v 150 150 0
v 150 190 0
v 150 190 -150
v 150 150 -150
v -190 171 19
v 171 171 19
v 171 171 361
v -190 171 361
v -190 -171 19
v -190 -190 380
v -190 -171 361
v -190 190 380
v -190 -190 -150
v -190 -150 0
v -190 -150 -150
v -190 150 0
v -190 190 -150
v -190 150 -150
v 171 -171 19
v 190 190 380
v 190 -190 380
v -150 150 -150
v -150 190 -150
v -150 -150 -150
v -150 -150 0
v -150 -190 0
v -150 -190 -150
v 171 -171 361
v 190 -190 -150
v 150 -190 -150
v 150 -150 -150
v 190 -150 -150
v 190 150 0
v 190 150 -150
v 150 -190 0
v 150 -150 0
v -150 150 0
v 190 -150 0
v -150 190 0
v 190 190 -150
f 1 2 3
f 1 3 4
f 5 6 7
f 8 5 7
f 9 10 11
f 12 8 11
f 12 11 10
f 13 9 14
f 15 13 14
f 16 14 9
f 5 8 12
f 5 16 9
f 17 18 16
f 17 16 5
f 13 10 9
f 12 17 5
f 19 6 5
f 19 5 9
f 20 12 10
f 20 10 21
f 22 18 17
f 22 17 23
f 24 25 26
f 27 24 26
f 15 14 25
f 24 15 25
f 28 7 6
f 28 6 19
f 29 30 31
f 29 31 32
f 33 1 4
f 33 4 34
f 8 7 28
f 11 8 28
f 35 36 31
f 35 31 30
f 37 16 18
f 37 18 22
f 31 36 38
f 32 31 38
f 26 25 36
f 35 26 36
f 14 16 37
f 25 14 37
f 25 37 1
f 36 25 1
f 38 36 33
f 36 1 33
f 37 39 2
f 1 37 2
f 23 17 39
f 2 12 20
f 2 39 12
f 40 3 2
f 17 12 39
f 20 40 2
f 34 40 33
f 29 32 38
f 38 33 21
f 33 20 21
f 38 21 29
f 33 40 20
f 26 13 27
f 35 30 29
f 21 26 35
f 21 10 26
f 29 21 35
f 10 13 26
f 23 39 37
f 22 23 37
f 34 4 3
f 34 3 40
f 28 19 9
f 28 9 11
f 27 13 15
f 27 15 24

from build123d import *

# Parameters (mm, degrees)
F0_W     = 380
F0_H     = 380
F1_DEPTH = 380
F2_W     = 342
F2_H     = 342
F3_DEPTH = 361
F4_W     = 40
F4_H     = 40
F5_DEPTH = 150


with BuildPart() as f1:
    # F0 (on Top) → F1 (new body)
    with BuildSketch(Plane.XY):
        Rectangle(F0_W, F0_H)
    extrude(amount=F1_DEPTH)

    # F2 (on face) → F3 (cut)
    with BuildSketch(Plane(origin=(-190, 0, 0), x_dir=(0, -1, 0), z_dir=(-1, 0, 0))):
        with Locations((0, 190)):
            Rectangle(F2_W, F2_H)
    extrude(amount=-F3_DEPTH, mode=Mode.SUBTRACT)

    # F4 (on face) → F5 (join)
    with BuildSketch(Plane(origin=(0, 0, 0), x_dir=(1, 0, 0), z_dir=(0, 0, -1))):
        with Locations((170, 170)):
            Rectangle(F4_W, F4_H)
        with Locations((-170, 170)):
            Rectangle(F4_W, F4_H)
        with Locations((-170, -170)):
            Rectangle(F4_W, F4_H)
        with Locations((170, -170)):
            Rectangle(F4_W, F4_H)
    extrude(amount=F5_DEPTH)


solid = f1.part
